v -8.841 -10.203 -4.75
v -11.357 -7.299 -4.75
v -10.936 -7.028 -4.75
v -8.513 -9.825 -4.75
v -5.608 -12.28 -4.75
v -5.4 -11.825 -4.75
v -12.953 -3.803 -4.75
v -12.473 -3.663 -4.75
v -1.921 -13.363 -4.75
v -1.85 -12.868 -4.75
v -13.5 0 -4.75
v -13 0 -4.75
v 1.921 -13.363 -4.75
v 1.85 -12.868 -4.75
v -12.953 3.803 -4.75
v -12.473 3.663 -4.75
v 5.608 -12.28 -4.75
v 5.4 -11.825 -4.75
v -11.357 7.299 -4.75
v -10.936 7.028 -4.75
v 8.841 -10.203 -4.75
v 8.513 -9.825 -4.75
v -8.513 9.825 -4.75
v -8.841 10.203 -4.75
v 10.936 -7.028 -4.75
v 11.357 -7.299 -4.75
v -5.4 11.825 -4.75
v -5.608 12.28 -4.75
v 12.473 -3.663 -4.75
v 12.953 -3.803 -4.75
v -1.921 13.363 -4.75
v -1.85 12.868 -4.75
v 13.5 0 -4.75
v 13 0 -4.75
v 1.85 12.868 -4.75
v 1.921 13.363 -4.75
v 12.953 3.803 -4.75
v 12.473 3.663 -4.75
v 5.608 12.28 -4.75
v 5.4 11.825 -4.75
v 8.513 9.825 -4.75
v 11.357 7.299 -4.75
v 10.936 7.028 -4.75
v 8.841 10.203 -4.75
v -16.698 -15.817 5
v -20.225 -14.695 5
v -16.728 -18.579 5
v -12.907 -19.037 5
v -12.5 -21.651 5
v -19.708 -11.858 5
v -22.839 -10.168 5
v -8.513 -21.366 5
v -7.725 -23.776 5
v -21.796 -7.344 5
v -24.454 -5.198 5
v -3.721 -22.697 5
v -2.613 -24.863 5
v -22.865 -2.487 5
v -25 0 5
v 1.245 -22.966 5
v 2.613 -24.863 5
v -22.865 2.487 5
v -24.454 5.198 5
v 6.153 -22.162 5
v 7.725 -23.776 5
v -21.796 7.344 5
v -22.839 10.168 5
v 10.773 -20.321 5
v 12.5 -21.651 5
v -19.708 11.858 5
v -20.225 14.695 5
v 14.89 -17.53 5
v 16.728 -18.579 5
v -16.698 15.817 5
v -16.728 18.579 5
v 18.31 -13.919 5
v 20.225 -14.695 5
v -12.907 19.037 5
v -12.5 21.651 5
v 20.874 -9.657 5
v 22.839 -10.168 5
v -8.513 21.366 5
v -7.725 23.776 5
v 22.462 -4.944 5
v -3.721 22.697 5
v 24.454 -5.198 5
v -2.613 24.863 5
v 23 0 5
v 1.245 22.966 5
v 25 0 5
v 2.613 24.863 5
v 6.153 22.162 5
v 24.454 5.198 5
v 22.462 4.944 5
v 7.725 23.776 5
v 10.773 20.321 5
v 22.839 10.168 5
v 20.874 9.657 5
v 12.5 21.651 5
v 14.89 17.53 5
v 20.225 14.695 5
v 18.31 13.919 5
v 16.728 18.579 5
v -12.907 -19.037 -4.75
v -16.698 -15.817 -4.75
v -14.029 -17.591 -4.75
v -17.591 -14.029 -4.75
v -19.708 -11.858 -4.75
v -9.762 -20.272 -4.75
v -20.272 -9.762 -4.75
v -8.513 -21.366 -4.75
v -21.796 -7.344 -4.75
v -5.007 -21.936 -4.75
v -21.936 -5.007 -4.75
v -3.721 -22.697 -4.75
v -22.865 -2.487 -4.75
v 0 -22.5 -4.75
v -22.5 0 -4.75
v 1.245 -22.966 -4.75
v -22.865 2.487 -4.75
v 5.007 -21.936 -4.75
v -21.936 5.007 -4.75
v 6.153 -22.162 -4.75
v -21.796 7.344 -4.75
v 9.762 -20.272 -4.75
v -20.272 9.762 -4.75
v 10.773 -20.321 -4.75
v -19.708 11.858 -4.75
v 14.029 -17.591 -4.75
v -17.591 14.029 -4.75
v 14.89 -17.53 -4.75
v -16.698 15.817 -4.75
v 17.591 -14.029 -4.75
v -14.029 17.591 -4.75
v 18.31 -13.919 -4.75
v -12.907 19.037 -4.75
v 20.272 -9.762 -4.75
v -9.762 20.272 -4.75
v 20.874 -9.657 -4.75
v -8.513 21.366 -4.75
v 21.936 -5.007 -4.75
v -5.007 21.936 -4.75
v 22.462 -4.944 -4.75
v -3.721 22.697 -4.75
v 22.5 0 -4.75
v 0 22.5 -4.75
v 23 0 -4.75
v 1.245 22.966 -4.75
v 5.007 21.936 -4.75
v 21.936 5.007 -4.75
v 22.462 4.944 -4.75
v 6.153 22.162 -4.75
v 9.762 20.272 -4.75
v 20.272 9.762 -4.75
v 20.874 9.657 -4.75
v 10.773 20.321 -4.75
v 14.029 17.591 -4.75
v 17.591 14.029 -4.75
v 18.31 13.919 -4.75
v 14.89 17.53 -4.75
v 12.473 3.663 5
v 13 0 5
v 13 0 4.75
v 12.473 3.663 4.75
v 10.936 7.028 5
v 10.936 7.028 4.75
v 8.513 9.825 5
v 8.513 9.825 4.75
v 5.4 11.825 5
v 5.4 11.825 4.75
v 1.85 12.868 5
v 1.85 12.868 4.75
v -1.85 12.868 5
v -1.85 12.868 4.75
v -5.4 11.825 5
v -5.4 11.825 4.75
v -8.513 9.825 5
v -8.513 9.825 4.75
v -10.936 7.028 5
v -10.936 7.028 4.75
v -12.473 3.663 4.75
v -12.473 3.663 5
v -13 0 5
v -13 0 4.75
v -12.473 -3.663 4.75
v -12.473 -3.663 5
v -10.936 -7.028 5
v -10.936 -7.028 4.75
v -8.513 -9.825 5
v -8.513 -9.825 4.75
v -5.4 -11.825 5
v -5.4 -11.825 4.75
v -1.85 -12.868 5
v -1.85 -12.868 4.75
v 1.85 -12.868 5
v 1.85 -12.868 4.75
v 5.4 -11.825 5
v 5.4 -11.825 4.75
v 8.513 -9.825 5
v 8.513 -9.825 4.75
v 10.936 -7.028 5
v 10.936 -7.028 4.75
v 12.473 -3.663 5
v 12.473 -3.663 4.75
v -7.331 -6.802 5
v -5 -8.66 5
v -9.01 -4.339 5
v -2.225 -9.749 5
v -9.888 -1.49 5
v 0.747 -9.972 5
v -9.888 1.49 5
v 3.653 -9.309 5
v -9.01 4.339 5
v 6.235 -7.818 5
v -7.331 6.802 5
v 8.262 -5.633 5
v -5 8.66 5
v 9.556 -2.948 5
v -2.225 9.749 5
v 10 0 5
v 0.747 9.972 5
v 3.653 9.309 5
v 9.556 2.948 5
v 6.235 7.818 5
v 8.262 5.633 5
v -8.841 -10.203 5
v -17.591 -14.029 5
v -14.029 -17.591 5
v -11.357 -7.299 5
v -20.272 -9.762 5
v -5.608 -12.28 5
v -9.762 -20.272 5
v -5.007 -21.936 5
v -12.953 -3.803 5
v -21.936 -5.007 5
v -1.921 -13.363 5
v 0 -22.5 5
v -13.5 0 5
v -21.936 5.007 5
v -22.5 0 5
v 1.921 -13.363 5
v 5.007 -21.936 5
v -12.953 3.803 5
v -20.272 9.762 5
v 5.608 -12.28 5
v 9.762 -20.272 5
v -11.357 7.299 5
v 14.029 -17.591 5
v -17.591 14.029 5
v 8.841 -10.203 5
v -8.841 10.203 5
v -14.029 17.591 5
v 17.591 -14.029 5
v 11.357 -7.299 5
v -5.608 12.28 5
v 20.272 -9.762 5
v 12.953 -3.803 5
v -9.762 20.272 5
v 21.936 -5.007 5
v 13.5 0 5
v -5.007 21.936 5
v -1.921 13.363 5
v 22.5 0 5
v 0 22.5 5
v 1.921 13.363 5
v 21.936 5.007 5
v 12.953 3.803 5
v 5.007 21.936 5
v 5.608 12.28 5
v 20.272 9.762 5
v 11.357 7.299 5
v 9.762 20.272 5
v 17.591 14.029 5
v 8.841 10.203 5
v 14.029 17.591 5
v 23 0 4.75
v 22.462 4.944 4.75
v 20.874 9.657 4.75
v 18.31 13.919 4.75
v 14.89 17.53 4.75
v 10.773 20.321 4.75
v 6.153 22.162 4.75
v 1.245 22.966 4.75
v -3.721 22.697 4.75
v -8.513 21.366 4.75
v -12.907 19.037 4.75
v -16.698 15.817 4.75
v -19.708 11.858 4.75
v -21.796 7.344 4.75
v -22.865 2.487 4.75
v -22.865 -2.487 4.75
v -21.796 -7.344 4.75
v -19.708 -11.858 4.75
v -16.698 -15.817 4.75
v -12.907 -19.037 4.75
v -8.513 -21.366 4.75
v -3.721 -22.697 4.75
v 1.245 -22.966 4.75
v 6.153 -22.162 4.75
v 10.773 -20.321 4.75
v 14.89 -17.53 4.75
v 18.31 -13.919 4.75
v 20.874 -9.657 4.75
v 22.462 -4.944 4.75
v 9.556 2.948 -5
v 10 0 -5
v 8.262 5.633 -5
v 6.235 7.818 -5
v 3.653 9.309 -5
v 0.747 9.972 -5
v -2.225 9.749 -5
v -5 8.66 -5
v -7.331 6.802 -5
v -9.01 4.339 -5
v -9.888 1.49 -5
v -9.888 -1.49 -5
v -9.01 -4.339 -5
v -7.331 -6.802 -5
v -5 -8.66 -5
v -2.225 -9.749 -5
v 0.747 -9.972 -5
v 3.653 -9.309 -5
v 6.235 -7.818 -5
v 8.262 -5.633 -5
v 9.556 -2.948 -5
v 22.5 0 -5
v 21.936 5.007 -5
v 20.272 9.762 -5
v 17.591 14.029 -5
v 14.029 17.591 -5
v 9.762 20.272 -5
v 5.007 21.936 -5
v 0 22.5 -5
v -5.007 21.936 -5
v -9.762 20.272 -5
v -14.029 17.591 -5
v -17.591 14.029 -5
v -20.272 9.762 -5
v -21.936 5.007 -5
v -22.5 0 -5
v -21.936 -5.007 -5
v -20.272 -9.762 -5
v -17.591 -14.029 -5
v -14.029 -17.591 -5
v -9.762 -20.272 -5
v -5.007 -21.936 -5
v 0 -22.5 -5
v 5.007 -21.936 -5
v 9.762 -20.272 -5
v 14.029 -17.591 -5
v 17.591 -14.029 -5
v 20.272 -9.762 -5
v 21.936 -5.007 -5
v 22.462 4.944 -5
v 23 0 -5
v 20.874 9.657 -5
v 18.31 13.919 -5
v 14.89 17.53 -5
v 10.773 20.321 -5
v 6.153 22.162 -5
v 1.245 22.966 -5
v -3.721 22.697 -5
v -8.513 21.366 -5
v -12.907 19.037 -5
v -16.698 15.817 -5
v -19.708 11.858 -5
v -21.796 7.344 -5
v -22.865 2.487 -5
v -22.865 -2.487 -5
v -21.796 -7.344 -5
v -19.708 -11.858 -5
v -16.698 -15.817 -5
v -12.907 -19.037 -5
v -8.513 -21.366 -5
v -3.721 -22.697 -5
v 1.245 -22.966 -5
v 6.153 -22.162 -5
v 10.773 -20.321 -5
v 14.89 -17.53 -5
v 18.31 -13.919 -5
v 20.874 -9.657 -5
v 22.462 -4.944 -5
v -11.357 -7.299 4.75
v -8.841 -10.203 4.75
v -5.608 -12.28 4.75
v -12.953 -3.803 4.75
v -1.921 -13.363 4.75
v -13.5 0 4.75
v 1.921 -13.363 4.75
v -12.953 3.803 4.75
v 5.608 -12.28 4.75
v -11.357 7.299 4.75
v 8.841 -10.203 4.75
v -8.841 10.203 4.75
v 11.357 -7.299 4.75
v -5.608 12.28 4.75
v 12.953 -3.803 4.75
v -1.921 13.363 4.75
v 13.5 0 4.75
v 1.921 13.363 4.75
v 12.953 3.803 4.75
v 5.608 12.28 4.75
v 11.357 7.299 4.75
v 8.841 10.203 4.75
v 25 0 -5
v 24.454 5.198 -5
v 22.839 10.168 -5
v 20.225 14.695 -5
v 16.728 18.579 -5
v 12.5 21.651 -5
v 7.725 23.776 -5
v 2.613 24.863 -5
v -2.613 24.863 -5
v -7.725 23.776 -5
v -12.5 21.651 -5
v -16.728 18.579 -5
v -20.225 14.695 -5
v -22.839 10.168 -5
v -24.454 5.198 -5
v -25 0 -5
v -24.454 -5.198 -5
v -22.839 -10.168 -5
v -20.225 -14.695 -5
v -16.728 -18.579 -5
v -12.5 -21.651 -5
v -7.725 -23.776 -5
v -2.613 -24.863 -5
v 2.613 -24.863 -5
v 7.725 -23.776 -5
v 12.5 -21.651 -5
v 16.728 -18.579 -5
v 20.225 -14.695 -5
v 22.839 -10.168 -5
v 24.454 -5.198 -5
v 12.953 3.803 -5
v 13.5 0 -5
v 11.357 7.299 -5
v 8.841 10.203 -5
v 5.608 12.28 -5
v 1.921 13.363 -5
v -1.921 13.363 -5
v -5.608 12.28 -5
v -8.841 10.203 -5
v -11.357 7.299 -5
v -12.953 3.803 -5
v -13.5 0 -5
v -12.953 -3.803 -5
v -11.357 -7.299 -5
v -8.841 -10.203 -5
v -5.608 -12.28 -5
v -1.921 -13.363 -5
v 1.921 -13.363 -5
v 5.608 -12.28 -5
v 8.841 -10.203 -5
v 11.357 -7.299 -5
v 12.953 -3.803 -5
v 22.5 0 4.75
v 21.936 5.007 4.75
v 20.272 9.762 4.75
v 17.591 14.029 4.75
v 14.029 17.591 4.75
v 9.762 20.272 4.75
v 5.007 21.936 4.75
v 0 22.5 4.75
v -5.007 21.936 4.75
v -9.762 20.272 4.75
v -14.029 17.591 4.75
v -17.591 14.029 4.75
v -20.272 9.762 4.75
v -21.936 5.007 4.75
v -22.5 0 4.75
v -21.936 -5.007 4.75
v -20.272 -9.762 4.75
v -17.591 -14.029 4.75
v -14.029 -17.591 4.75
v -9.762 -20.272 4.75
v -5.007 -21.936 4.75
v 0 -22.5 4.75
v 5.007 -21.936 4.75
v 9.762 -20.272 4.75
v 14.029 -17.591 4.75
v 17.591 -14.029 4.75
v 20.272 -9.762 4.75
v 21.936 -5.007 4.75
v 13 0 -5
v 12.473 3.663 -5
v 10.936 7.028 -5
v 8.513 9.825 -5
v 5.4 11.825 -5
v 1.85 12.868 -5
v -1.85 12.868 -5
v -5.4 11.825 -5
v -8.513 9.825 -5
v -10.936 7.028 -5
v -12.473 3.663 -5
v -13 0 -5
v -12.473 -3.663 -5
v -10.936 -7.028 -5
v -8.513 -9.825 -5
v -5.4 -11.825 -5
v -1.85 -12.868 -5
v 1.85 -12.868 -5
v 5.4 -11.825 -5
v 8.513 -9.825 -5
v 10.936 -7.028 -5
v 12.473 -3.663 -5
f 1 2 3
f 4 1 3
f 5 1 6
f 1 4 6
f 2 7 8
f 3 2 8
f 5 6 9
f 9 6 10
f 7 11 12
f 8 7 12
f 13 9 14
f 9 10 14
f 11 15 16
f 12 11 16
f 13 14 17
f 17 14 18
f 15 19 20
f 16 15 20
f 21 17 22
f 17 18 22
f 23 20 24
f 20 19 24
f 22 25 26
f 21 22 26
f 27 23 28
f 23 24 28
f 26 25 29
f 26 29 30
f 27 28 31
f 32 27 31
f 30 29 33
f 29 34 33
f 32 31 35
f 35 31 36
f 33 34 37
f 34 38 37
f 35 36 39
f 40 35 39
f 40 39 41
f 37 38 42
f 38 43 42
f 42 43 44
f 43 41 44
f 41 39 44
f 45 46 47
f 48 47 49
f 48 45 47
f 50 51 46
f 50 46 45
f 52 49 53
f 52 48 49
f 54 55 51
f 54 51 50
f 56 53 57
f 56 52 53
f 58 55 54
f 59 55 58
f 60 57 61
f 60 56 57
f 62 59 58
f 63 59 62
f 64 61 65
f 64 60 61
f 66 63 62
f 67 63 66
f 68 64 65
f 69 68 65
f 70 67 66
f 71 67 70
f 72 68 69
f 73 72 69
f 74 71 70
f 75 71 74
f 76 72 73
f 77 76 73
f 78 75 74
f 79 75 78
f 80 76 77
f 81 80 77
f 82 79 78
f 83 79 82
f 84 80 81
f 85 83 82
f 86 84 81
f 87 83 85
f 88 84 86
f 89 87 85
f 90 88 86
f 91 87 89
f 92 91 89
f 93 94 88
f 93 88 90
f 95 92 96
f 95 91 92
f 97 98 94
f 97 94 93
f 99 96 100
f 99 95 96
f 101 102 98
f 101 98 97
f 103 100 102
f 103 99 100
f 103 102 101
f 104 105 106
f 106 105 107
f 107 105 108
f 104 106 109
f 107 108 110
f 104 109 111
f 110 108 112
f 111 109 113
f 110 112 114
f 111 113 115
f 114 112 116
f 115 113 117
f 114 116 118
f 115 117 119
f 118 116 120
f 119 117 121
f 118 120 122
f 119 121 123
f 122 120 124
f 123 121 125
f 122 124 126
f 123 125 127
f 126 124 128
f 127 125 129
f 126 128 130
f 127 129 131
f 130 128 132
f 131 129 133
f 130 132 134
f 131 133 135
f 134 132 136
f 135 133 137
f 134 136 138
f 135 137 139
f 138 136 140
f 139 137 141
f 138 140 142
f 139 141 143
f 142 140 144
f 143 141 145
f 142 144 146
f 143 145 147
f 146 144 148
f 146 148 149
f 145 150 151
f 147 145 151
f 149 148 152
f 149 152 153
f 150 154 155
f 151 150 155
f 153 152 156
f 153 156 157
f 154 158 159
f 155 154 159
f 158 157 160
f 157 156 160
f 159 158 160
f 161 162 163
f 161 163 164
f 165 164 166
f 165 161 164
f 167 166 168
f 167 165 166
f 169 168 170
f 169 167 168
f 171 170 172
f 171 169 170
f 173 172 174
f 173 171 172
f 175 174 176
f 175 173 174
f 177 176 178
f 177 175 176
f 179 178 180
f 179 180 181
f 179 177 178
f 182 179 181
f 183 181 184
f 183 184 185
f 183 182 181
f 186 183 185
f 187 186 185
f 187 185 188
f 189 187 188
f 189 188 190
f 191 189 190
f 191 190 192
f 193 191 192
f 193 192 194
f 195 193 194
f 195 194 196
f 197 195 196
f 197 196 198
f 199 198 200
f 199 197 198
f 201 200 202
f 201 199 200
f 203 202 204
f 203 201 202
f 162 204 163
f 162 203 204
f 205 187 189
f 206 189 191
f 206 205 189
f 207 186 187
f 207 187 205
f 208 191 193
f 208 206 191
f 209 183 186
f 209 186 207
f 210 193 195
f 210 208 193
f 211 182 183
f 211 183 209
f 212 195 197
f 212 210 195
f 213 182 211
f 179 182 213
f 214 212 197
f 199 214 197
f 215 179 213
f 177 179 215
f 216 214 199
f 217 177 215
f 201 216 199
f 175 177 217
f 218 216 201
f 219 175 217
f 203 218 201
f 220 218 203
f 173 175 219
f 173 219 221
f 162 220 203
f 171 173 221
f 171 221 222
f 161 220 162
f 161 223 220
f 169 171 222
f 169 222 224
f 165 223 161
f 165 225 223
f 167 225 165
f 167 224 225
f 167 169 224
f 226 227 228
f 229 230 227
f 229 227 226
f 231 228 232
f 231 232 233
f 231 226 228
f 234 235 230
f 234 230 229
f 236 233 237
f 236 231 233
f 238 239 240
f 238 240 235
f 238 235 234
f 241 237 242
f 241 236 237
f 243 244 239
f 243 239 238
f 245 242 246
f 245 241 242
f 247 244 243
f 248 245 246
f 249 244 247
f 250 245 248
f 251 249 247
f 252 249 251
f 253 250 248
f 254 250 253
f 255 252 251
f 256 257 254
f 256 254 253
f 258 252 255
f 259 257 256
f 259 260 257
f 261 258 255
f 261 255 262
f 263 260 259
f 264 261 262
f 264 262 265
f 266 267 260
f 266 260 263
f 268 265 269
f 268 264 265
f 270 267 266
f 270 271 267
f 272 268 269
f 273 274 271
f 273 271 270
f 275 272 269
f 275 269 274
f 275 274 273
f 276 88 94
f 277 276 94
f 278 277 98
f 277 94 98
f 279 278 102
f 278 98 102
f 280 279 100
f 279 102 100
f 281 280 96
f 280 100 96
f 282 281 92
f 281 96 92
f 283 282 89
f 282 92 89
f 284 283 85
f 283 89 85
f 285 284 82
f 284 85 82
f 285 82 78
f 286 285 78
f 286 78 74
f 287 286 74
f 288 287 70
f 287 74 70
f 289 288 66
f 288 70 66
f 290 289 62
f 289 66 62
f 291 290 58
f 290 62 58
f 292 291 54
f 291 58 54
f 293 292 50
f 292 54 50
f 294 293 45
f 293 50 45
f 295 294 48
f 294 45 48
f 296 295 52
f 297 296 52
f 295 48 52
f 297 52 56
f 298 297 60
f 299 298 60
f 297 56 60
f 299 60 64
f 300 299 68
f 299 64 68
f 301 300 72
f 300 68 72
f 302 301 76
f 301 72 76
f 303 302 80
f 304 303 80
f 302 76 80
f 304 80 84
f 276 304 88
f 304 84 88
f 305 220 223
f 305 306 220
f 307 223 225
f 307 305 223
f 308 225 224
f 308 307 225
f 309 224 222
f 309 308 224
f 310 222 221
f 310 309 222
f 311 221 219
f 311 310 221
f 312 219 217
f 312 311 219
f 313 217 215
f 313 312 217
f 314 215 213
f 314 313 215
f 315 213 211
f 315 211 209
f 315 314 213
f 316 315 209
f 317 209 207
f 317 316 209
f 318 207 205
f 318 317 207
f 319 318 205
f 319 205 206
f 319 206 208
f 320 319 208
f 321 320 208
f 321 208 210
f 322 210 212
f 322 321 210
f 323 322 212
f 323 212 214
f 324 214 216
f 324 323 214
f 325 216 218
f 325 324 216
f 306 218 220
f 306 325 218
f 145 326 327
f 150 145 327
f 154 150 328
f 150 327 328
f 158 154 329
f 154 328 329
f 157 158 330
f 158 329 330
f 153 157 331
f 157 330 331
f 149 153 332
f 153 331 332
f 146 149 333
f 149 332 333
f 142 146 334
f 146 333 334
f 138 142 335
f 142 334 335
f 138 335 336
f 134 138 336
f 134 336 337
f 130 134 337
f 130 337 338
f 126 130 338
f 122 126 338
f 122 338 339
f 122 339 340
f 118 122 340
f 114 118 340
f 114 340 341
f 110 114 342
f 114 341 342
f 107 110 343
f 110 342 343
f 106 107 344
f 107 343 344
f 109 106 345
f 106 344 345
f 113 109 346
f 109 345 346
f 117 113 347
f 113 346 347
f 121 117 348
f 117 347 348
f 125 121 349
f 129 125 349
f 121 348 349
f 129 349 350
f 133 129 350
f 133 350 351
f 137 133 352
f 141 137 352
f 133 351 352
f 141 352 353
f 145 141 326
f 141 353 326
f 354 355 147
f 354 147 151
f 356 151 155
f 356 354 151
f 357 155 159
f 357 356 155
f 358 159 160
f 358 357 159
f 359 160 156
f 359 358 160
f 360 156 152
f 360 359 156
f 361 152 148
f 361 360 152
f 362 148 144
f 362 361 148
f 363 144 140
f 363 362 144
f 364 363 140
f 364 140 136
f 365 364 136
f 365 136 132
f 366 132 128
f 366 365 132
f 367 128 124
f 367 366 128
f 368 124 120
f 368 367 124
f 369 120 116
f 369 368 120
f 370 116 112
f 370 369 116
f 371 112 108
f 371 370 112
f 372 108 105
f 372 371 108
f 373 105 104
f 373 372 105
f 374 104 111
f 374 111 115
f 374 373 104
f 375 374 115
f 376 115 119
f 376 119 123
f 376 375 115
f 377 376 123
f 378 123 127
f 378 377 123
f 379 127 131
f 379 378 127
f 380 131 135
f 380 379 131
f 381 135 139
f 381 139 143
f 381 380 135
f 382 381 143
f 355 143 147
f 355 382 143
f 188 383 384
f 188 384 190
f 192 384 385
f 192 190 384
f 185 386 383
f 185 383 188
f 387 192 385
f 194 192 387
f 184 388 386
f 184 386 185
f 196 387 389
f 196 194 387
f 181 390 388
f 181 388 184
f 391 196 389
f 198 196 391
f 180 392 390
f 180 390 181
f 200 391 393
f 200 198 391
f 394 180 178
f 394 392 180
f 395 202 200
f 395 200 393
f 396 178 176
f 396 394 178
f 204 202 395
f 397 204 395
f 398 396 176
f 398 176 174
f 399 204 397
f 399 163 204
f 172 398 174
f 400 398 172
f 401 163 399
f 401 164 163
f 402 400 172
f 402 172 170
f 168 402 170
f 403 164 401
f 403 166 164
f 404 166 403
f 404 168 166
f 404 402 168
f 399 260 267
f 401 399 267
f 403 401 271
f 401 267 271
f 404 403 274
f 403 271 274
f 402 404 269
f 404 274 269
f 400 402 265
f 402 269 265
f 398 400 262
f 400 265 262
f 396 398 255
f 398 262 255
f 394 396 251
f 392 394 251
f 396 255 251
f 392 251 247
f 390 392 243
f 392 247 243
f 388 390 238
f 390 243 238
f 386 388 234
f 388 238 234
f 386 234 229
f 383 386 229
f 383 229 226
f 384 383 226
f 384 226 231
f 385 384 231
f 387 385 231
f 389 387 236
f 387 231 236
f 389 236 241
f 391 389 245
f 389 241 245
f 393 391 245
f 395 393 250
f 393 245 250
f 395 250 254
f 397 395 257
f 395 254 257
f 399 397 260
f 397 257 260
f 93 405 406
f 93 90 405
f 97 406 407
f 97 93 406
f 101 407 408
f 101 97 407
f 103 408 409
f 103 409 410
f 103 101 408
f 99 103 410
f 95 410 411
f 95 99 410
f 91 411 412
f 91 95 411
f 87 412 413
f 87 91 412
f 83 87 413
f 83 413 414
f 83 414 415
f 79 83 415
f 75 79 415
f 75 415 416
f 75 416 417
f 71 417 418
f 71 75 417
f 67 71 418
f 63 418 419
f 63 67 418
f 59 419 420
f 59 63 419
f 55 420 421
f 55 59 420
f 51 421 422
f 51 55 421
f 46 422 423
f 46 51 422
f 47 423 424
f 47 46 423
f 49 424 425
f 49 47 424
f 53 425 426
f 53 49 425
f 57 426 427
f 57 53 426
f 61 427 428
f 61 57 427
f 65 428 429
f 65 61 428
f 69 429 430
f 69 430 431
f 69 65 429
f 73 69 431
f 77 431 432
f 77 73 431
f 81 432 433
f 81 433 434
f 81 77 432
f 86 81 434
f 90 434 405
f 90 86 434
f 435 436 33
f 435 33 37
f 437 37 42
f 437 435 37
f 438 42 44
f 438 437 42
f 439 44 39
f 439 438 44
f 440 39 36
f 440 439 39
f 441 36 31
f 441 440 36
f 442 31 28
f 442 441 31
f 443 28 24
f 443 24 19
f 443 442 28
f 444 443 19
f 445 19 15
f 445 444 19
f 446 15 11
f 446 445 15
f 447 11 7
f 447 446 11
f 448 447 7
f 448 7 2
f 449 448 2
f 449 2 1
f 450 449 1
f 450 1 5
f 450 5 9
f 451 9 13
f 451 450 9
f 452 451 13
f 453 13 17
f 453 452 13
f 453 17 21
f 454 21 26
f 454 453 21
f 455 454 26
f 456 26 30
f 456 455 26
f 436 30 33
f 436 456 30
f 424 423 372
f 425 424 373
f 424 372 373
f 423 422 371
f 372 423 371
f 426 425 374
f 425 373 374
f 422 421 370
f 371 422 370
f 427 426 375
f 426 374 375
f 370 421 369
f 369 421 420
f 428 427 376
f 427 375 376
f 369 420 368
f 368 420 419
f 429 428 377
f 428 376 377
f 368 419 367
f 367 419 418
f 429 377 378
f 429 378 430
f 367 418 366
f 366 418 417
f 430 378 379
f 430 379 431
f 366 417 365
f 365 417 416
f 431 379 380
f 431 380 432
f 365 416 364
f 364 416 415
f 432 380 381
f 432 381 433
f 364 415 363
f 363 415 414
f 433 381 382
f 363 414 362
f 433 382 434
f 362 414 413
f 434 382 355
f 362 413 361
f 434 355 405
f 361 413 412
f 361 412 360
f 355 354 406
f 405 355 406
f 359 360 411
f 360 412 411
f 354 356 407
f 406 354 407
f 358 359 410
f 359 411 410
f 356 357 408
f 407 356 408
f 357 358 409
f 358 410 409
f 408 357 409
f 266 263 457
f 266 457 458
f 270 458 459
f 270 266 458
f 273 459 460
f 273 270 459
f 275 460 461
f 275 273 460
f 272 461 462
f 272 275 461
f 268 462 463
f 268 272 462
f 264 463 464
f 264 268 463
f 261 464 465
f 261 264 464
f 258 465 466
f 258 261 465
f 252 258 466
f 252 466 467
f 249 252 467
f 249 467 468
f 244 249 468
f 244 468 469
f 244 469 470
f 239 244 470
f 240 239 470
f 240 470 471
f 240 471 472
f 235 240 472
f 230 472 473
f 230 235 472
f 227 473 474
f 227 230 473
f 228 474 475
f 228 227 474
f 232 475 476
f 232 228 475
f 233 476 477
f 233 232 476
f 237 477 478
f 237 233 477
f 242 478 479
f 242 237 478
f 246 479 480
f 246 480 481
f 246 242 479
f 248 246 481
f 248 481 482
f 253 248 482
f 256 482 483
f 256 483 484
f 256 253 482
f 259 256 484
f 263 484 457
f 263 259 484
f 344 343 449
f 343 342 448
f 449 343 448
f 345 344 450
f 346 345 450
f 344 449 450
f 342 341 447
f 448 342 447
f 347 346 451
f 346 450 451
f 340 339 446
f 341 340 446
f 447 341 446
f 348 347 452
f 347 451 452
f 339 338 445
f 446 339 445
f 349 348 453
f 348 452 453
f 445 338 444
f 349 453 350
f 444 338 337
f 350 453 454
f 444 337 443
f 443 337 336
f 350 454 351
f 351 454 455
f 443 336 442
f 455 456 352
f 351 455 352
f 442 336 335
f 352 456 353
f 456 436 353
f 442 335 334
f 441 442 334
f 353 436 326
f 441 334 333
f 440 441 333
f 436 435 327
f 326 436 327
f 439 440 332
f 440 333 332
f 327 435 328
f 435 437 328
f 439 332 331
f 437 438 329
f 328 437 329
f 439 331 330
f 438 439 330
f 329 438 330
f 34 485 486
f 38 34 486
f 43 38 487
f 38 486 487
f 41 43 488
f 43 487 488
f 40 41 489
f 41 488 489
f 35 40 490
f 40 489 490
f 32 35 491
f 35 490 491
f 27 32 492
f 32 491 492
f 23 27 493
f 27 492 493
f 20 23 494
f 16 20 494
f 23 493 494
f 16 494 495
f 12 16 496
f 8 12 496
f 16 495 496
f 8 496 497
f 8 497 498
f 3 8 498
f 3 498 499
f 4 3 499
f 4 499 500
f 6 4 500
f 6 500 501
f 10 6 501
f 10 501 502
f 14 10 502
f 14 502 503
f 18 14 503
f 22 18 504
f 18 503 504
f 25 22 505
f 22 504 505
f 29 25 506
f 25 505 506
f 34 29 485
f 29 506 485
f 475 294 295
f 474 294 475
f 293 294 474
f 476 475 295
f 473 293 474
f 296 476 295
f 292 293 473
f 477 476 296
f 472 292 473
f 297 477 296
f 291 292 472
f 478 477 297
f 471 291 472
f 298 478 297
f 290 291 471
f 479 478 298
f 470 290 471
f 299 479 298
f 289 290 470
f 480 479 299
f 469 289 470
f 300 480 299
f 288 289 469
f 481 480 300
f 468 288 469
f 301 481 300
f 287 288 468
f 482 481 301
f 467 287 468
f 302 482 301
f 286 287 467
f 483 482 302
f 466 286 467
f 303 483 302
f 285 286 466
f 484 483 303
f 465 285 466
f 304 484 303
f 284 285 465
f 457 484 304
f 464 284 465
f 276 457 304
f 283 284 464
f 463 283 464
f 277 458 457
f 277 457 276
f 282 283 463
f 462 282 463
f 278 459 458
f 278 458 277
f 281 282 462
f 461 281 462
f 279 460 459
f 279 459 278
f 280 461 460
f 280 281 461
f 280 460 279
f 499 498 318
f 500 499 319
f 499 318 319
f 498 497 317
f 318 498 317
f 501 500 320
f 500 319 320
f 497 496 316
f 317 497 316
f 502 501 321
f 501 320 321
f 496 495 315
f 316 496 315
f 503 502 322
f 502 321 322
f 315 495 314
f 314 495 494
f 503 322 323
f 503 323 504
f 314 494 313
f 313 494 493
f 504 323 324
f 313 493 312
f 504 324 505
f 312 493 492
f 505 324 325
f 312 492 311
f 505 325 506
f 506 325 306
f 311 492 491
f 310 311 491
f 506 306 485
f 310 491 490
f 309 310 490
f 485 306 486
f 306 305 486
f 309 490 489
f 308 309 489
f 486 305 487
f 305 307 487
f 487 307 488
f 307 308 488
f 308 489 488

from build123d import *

# Parameters (mm, degrees)
ESBO_O1_R                = 25
ESBO_O1_R_2              = 10
RESSALTO_EXTRUS_O1_DEPTH = 5
ESBO_O2_R                = 23
ESBO_O2_R_2              = 22.5
ESBO_O2_R_3              = 13.5
ESBO_O2_R_4              = 13
CORTE_EXTRUS_O1_DEPTH    = 0.25


with BuildPart() as part:
    # Esboço1 → Ressalto-extrusão1 (new, symmetric)
    with BuildSketch(Plane.XY):
        Circle(ESBO_O1_R)
        Circle(ESBO_O1_R_2, mode=Mode.SUBTRACT)
    extrude(amount=RESSALTO_EXTRUS_O1_DEPTH, both=True)

    # Esboço2 → Corte-extrusão1 (cut)
    # profile 1 of 2: a face of its own
    with BuildSketch(Plane.XY.offset(5)):
        Circle(ESBO_O2_R)
        Circle(ESBO_O2_R_2, mode=Mode.SUBTRACT)
    # profile 2 of 2: a face of its own
    with BuildSketch(Plane.XY.offset(5)):
        Circle(ESBO_O2_R_3)
        Circle(ESBO_O2_R_4, mode=Mode.SUBTRACT)
    corte_extrus_o1 = extrude(amount=-CORTE_EXTRUS_O1_DEPTH, mode=Mode.SUBTRACT)

    # Espelhar1: Corte-extrusão1 across plane
    add(corte_extrus_o1.mirror(Plane.XY), mode=Mode.SUBTRACT)


solid = part.part
